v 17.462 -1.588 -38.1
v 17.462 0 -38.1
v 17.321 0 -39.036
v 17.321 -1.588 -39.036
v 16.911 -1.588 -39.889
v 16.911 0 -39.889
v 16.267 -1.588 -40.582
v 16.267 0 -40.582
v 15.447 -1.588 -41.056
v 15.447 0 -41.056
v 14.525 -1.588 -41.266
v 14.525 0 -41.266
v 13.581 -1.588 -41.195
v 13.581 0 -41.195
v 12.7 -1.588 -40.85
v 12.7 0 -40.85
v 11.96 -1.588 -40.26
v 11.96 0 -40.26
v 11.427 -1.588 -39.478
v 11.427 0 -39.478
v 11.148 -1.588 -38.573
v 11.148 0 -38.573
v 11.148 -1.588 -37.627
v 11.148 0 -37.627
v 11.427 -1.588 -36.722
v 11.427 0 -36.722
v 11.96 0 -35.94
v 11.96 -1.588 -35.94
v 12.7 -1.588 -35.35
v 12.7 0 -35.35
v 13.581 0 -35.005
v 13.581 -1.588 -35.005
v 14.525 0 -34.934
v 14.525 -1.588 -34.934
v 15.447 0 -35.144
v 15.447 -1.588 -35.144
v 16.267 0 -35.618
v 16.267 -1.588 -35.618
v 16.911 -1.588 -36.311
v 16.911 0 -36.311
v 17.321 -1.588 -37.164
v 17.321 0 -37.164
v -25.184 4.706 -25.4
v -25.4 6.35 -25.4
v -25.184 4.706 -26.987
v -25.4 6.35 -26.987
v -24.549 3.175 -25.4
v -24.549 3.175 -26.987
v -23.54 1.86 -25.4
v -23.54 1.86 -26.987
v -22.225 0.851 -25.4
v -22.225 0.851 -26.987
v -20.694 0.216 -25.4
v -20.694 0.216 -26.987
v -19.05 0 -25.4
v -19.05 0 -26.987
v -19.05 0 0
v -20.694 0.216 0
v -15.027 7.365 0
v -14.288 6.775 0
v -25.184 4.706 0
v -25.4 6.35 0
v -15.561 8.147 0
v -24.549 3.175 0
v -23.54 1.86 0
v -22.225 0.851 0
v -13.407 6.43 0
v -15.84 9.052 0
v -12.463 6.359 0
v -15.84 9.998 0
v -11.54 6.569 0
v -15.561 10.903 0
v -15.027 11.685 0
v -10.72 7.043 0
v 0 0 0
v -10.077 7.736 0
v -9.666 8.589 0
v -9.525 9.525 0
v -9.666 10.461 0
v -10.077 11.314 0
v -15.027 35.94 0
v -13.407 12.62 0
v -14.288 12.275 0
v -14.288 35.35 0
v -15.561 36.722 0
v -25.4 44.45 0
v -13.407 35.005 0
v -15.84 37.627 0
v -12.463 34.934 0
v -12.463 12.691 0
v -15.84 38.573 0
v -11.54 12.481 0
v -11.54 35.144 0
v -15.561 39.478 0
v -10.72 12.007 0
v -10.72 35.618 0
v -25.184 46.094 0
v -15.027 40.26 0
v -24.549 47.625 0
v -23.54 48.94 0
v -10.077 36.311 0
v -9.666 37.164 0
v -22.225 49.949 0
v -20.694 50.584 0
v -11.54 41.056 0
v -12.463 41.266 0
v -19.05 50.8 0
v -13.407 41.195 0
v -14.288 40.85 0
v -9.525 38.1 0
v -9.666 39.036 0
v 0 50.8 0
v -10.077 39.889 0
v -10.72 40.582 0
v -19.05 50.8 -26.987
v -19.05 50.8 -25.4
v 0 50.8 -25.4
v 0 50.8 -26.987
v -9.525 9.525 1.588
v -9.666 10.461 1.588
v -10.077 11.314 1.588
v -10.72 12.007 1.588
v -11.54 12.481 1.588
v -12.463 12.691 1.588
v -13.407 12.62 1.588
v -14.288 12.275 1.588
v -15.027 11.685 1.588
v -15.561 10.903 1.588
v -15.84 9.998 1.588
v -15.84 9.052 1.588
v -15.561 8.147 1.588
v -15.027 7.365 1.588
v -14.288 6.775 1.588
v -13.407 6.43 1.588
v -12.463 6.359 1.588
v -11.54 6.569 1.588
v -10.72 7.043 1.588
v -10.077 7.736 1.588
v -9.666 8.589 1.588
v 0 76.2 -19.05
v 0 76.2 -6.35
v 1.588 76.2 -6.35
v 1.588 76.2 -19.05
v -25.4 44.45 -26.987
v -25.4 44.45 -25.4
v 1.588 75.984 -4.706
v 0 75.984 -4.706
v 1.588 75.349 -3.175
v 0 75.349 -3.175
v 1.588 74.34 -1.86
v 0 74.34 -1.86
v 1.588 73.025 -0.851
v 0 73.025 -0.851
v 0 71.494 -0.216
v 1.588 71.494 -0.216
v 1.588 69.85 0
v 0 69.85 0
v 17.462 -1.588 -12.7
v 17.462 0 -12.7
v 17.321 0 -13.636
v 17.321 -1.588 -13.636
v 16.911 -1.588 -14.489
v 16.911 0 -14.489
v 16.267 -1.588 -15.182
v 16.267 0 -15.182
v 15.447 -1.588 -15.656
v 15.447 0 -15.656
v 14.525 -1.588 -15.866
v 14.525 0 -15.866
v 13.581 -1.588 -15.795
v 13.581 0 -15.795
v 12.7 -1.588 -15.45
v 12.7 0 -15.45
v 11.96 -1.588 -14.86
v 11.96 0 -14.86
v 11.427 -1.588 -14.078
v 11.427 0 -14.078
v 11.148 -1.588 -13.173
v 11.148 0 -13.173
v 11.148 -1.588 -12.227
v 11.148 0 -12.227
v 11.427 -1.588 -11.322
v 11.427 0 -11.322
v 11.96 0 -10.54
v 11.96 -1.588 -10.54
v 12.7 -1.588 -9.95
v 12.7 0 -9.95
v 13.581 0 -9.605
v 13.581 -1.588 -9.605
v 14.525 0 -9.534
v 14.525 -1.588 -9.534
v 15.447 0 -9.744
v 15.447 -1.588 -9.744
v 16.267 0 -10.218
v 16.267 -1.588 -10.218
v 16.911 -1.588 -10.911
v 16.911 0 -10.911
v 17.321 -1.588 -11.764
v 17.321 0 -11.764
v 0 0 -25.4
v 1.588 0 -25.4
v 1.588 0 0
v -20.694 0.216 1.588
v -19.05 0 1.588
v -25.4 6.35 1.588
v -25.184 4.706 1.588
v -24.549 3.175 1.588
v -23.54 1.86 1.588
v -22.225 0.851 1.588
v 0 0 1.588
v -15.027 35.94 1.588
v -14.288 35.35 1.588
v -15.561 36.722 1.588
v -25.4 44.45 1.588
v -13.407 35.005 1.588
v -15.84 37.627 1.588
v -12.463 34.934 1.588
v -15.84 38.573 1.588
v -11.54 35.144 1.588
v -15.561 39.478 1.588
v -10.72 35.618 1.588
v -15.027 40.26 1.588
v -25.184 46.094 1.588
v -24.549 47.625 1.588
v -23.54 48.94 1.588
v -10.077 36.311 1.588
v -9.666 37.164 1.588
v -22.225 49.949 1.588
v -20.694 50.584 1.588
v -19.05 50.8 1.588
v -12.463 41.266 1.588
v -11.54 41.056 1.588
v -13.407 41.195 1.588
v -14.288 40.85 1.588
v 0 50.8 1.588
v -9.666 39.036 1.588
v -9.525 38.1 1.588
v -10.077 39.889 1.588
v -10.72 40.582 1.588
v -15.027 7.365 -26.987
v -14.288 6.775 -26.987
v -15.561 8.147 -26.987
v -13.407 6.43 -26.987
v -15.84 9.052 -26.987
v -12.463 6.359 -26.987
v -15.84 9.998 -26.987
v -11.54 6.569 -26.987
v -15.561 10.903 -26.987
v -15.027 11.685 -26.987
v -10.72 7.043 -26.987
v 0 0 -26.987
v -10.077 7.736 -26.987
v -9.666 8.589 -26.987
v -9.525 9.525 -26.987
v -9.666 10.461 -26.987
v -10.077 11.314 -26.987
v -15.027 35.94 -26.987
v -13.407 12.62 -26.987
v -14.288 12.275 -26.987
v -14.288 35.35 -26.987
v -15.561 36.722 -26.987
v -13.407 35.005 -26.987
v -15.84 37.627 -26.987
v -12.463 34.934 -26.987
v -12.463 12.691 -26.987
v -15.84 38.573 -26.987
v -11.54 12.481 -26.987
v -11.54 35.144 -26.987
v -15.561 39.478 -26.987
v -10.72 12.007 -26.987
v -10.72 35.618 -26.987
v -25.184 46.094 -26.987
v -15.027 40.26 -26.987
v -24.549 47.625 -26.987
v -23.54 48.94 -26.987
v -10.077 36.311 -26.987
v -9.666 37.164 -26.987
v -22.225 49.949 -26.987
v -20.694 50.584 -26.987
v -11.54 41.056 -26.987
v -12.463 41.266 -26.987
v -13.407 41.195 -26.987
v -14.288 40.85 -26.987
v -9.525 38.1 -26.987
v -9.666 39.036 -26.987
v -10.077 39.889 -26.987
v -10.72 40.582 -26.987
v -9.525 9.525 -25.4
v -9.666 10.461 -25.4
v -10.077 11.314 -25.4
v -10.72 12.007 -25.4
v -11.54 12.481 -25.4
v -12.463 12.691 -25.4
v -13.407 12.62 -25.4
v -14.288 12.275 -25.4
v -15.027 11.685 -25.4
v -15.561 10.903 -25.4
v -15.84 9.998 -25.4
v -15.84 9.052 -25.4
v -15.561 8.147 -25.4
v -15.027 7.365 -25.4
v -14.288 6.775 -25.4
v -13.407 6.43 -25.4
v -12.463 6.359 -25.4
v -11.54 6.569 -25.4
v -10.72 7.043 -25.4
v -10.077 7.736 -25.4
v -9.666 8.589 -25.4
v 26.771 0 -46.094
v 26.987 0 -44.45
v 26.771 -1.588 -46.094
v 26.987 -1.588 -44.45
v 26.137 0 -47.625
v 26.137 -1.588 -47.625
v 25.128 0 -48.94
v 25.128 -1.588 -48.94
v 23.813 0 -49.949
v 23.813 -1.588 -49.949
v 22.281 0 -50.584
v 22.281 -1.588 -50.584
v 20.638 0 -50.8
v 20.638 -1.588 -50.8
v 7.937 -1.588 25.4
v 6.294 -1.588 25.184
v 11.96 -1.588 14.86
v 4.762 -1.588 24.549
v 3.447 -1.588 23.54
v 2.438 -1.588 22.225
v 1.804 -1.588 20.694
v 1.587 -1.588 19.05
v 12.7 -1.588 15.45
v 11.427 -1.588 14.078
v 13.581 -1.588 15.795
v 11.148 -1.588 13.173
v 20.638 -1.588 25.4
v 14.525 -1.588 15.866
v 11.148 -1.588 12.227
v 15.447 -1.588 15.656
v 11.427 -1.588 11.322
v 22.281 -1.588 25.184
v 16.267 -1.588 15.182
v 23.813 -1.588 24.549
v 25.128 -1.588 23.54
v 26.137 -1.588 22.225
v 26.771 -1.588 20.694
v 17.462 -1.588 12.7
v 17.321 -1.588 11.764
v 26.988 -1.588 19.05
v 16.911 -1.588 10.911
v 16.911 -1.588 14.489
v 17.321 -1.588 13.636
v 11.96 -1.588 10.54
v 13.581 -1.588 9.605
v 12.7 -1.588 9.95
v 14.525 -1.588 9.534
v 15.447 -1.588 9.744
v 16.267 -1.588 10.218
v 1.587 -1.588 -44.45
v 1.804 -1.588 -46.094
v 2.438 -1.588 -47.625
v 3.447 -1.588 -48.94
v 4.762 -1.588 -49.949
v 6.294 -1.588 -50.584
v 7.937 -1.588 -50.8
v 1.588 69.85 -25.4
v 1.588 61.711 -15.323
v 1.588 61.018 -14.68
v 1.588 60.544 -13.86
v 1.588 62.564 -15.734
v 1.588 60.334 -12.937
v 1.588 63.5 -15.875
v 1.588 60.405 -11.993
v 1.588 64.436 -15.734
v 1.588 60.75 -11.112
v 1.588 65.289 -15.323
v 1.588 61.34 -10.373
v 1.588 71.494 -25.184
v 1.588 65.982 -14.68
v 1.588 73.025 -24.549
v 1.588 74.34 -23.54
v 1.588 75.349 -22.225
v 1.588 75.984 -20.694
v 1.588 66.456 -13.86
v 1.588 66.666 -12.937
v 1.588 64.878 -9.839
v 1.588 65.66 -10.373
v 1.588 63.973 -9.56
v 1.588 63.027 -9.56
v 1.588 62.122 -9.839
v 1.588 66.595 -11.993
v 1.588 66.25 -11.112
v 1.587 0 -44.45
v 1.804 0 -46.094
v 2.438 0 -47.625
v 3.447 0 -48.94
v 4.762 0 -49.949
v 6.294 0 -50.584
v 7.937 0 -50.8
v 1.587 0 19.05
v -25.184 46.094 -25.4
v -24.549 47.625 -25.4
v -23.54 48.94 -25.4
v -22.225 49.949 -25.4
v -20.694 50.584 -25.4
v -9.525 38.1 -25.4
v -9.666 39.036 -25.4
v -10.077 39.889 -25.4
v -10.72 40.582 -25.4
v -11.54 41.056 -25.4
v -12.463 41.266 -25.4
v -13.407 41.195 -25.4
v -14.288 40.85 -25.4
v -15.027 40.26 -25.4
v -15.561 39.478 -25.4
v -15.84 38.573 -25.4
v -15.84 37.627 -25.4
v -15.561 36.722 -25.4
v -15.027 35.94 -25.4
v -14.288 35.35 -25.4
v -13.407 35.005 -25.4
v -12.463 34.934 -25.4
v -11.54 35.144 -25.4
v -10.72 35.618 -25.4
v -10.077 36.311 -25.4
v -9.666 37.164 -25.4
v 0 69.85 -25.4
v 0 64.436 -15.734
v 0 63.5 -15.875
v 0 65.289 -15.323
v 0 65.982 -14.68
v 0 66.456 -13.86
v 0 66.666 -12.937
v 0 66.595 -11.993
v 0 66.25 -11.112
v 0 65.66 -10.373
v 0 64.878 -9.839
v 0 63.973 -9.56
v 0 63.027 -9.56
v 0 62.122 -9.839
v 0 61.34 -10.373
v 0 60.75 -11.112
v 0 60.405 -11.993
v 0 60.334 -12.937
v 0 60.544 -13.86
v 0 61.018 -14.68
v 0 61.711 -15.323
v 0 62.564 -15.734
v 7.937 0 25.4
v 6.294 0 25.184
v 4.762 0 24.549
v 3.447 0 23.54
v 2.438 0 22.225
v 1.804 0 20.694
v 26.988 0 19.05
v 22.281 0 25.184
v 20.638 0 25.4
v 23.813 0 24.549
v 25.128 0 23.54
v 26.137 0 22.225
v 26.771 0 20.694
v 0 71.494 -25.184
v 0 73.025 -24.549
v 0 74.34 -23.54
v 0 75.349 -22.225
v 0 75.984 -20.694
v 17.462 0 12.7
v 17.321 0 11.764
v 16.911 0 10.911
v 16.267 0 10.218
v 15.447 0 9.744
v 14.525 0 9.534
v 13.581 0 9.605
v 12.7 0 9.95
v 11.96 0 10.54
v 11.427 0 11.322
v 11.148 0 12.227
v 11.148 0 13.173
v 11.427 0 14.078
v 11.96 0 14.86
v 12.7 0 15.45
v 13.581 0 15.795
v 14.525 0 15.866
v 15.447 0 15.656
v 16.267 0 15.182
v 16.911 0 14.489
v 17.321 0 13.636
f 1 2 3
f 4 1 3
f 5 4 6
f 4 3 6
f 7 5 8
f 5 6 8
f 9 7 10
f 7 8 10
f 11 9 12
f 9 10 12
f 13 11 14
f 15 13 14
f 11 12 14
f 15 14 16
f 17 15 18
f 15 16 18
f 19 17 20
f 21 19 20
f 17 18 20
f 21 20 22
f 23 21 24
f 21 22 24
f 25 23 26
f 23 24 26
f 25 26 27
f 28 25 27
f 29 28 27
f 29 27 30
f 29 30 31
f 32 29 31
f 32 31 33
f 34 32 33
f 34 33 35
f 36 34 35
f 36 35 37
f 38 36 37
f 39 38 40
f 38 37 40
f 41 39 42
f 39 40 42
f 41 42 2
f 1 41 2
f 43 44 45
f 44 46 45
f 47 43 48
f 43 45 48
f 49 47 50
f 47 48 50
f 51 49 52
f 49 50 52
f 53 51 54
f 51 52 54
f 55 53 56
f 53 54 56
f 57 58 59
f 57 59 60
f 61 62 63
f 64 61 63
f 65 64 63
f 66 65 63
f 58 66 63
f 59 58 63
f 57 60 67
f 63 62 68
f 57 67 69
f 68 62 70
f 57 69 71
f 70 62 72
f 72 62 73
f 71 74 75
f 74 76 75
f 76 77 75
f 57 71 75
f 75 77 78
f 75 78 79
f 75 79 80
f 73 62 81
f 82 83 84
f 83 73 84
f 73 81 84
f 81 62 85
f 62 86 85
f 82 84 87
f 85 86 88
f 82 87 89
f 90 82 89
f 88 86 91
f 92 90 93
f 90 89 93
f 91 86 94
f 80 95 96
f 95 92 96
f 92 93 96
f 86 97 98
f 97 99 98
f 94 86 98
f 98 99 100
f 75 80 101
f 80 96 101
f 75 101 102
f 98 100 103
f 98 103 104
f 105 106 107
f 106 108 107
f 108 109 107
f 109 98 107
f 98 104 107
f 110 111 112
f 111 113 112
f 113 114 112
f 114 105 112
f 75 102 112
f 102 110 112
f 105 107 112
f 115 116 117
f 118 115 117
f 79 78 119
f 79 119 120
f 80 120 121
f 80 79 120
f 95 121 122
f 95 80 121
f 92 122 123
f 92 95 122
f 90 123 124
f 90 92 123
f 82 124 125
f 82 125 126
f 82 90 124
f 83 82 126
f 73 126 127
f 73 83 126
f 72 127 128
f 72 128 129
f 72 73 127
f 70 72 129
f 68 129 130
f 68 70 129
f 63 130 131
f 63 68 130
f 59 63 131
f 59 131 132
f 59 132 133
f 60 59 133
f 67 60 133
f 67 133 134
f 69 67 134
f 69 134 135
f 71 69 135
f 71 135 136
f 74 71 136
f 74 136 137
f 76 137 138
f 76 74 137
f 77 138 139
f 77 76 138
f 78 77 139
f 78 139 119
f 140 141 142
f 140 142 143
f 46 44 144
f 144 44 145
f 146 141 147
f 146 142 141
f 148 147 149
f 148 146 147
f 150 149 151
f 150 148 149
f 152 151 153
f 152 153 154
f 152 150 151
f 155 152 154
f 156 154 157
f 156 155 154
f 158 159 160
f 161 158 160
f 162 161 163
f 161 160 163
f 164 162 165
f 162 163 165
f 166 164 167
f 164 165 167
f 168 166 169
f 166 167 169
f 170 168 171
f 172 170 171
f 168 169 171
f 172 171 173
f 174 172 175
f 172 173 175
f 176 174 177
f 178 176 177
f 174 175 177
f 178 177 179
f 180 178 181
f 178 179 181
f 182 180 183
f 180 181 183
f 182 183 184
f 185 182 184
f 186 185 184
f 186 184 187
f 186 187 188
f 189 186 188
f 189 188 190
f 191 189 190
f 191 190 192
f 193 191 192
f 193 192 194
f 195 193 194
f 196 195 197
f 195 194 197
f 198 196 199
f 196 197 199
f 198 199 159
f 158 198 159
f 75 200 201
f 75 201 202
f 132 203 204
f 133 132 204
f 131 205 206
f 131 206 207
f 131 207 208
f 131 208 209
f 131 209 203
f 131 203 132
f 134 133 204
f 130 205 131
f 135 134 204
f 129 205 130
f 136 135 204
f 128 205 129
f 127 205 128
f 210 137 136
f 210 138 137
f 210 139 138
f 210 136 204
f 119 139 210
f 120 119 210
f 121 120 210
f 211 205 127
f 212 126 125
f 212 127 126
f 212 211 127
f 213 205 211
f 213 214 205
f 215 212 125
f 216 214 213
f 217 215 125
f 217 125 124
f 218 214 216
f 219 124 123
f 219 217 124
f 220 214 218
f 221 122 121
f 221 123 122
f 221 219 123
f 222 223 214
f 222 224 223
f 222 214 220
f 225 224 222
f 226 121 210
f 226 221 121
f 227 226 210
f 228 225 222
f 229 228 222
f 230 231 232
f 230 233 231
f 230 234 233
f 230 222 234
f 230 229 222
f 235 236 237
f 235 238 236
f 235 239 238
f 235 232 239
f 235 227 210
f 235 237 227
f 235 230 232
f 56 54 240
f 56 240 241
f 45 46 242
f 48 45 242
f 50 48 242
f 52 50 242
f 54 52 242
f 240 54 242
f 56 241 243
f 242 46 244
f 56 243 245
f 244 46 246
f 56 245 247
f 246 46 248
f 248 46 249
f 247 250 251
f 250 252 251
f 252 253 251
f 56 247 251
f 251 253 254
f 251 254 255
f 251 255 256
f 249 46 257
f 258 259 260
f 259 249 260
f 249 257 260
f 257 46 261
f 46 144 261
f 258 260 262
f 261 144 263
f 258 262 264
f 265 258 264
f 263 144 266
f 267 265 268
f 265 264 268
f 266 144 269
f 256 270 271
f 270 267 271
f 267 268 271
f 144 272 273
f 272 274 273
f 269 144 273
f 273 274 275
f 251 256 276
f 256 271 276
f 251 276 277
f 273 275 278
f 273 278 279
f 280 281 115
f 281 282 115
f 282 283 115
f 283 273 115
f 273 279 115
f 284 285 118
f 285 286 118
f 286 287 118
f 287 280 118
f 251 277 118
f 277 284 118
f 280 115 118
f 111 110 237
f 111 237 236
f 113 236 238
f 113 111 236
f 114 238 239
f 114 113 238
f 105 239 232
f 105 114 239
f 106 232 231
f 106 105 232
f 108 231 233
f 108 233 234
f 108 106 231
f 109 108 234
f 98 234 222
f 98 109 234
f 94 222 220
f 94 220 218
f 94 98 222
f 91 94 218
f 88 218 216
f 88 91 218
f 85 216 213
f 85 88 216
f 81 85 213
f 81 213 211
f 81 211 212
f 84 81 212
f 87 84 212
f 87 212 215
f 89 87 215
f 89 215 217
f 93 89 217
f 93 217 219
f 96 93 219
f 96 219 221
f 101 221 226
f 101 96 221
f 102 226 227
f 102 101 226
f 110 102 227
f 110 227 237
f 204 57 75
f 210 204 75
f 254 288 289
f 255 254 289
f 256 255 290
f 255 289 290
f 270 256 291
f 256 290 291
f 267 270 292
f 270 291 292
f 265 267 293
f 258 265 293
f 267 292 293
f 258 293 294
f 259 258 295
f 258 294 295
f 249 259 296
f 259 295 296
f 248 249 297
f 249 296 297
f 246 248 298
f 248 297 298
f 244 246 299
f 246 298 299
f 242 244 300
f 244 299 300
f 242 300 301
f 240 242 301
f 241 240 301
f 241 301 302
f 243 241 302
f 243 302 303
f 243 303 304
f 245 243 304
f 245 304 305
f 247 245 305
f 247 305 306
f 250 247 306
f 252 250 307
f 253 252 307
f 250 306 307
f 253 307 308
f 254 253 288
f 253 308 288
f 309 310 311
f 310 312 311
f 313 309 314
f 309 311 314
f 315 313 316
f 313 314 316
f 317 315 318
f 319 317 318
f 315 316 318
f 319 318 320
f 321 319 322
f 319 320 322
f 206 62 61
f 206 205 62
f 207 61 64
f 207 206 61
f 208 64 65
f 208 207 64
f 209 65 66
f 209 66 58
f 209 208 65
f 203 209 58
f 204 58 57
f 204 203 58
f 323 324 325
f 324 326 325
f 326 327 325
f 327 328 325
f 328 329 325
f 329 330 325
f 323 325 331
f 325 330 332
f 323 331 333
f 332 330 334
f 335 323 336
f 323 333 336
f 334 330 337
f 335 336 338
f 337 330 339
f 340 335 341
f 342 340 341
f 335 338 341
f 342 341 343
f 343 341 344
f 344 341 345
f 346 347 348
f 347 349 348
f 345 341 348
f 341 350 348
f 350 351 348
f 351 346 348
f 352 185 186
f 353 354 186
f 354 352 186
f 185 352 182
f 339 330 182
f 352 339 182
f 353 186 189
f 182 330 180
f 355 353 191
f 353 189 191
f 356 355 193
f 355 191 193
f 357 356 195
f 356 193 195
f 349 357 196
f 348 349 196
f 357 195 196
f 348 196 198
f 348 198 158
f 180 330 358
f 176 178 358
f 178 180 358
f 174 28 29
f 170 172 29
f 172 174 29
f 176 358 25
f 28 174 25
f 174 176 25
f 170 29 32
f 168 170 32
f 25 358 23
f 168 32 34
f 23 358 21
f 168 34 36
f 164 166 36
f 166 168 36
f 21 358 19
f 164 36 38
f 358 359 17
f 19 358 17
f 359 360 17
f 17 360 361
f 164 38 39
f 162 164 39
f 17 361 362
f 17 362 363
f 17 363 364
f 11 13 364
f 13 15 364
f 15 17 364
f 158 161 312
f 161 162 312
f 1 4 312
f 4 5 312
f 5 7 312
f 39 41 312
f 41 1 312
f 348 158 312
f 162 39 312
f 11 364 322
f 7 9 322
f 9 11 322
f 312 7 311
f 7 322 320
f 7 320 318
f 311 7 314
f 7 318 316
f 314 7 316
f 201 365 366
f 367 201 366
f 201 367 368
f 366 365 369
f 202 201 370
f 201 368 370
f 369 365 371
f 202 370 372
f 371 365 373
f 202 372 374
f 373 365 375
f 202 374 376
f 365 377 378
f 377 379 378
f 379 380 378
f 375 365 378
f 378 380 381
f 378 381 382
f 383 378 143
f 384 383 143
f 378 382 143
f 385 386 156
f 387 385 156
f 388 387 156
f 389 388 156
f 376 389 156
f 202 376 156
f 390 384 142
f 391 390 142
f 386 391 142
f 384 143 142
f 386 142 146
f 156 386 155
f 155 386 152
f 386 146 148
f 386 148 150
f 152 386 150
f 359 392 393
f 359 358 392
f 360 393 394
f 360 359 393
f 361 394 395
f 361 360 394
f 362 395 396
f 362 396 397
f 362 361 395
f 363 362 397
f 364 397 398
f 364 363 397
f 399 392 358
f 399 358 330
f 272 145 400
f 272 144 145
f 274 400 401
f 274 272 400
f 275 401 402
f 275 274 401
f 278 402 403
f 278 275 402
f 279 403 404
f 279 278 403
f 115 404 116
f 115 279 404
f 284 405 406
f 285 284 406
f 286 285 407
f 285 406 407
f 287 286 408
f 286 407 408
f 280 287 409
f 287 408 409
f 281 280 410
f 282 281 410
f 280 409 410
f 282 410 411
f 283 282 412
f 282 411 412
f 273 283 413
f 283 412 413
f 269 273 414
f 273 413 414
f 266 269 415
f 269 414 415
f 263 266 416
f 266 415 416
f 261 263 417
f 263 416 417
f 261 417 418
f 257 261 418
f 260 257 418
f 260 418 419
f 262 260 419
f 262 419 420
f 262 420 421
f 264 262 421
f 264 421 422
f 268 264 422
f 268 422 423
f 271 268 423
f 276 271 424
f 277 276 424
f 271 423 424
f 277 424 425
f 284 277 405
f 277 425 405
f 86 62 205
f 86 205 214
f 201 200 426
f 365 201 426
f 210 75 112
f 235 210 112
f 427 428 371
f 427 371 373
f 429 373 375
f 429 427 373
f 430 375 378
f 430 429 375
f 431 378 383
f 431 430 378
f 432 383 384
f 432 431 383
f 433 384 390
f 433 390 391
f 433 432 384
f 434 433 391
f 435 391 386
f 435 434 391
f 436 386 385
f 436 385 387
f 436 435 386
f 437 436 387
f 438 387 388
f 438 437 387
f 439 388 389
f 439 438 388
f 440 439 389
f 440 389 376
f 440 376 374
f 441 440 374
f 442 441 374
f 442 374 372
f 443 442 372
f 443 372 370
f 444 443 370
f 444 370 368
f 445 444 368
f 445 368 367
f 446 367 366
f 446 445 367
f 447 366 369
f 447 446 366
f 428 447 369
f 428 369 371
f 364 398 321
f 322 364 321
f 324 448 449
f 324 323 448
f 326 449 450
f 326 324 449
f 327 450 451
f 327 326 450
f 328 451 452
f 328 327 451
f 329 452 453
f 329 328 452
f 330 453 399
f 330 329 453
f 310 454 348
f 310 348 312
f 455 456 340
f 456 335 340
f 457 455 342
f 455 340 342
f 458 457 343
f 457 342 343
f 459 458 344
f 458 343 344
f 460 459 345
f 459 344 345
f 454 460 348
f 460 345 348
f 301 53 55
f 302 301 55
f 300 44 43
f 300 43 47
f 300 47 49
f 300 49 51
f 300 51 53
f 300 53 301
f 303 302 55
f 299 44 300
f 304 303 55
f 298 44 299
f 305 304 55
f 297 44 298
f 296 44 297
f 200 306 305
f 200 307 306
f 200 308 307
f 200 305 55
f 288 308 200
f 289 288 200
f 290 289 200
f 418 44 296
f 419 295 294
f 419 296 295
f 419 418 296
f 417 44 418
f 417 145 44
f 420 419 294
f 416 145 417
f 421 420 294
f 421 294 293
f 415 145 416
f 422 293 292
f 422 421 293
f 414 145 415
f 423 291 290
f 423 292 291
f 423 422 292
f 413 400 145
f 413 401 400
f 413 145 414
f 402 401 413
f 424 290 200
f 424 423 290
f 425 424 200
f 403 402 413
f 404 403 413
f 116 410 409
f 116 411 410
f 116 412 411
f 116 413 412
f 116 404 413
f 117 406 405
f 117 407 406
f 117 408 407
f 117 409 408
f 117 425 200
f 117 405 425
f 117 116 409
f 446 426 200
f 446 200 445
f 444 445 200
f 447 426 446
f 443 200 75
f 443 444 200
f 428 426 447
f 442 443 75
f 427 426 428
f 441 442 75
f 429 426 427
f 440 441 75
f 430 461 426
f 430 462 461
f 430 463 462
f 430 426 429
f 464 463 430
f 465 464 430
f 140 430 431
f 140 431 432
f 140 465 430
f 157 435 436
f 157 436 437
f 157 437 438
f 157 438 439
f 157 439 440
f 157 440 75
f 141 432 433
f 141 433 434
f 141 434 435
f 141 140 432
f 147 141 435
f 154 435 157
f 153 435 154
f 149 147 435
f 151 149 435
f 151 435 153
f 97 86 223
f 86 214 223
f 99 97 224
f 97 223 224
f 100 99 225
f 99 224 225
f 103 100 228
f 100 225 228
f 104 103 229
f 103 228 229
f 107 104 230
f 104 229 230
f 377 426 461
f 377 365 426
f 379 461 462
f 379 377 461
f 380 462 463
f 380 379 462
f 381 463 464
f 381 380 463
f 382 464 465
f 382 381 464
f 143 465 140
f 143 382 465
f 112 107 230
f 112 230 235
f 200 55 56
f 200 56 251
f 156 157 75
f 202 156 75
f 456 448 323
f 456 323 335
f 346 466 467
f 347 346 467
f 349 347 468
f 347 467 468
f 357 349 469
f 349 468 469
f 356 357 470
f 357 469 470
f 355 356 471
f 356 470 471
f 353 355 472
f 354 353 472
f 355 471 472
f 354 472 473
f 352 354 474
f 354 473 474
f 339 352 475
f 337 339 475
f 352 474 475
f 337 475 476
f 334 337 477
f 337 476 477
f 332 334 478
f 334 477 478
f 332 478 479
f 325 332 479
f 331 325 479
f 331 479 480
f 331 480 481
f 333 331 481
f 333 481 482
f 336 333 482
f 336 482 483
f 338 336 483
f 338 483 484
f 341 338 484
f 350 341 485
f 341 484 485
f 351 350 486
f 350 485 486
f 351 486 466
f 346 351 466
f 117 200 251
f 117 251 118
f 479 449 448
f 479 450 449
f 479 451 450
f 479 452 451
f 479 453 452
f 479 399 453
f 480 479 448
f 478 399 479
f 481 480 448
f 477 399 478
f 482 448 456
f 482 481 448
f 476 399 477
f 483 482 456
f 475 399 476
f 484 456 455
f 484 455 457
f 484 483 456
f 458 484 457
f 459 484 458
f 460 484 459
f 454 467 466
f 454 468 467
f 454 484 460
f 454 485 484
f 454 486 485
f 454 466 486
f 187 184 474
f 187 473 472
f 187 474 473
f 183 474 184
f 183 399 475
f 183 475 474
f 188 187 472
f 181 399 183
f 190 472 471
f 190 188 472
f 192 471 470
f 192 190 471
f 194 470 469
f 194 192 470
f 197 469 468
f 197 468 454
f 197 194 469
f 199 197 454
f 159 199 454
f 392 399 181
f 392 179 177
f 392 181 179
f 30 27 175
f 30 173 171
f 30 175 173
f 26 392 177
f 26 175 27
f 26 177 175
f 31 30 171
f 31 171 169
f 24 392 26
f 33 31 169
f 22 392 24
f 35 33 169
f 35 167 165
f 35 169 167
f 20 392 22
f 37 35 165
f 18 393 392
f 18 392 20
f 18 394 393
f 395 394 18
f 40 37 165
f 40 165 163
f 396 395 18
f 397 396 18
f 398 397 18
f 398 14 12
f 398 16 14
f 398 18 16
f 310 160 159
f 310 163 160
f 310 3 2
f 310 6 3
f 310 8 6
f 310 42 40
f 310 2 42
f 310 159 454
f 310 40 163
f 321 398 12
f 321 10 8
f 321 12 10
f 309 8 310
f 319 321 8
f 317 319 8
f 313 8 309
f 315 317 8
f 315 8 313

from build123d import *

# Parameters (mm, degrees)
SKETCH1_W           = 25.4
SKETCH1_H           = 50.8
SKETCH1_R           = 3.175
BOSS_EXTRUDE1_DEPTH = 1.5875
BOSS_EXTRUDE2_START = -25.4
SKETCH1_2_W         = 25.4
SKETCH1_2_H         = 50.8
SKETCH1_2_R         = 3.175
BOSS_EXTRUDE2_DEPTH = 1.5875
SKETCH3_R           = 3.175
BOSS_EXTRUDE3_DEPTH = 1.5875
SKETCH4_W           = 25.4
SKETCH4_H           = 76.2
SKETCH4_R           = 3.175
BOSS_EXTRUDE4_DEPTH = 1.5875
FILLET1_R           = 6.35
FILLET2_R           = 6.35
FILLET3_R           = 6.35
FILLET4_R           = 6.35


with BuildPart() as part:
    # Sketch1 → Boss-Extrude1 (new body)
    with BuildSketch(Plane.XY):
        with Locations((-12.7, 25.4)):
            Rectangle(SKETCH1_W, SKETCH1_H)
        with Locations((-12.7, 38.1)):
            Circle(SKETCH1_R, mode=Mode.SUBTRACT)
        with Locations((-12.7, 9.525)):
            Circle(SKETCH1_R, mode=Mode.SUBTRACT)
    extrude(amount=BOSS_EXTRUDE1_DEPTH)

    # Fillet3
    fillet3_edges = [part.edges().sort_by_distance(p)[0] for p in [
        (-25.4, 50.8, 0.79375),
        (-25.4, 0, 0.79375),
    ]]
    fillet(fillet3_edges, radius=FILLET3_R)


with BuildPart() as body_2:
    # Sketch1<2> → Boss-Extrude2 (new body)
    with BuildSketch(Plane.XY.offset(BOSS_EXTRUDE2_START)):
        with Locations((-12.7, 25.4)):
            Rectangle(SKETCH1_2_W, SKETCH1_2_H)
        with Locations((-12.7, 38.1)):
            Circle(SKETCH1_2_R, mode=Mode.SUBTRACT)
        with Locations((-12.7, 9.525)):
            Circle(SKETCH1_2_R, mode=Mode.SUBTRACT)
    extrude(amount=-BOSS_EXTRUDE2_DEPTH)

    # Fillet2
    fillet2_edges = [body_2.edges().sort_by_distance(p)[0] for p in [
        (-25.4, 0, -26.19375),
        (-25.4, 50.8, -26.19375),
    ]]
    fillet(fillet2_edges, radius=FILLET2_R)


with BuildPart() as body_3:
    # Sketch3 → Boss-Extrude3 (new body)
    with BuildSketch(Plane(origin=(0, 0, 0), x_dir=(0, 0, -1), z_dir=(1, 0, 0))):
        Polygon((25.4, 50.8), (25.4, 0), (0, 0), (0, 50.8), (0, 76.2), (25.4, 76.2), align=None)
        with Locations((12.7, 63.5)):
            Circle(SKETCH3_R, mode=Mode.SUBTRACT)
    extrude(amount=BOSS_EXTRUDE3_DEPTH)

    # Fillet4
    fillet4_edges = [body_3.edges().sort_by_distance(p)[0] for p in [
        (0.79375, 76.2, -25.4),
        (0.79375, 76.2, 0),
    ]]
    fillet(fillet4_edges, radius=FILLET4_R)


with BuildPart() as body_4:
    # Sketch4 → Boss-Extrude4 (new body)
    with BuildSketch(Plane(origin=(0, 0, 0), x_dir=(1, 0, 0), z_dir=(0, 1, 0))):
        with Locations((14.2875, 12.7)):
            Rectangle(SKETCH4_W, SKETCH4_H)
        with Locations((14.2875, 38.1)):
            Circle(SKETCH4_R, mode=Mode.SUBTRACT)
        with Locations((14.2875, 12.7)):
            Circle(SKETCH4_R, mode=Mode.SUBTRACT)
        with Locations((14.2875, -12.7)):
            Circle(SKETCH4_R, mode=Mode.SUBTRACT)
    extrude(amount=-BOSS_EXTRUDE4_DEPTH)

    # Fillet1
    fillet1_edges = [body_4.edges().sort_by_distance(p)[0] for p in [
        (1.5875, -0.79375, -50.8),
        (26.9875, -0.79375, -50.8),
        (26.9875, -0.79375, 25.4),
        (1.5875, -0.79375, 25.4),
    ]]
    fillet(fillet1_edges, radius=FILLET1_R)


solid = Compound([part.part, body_2.part, body_3.part, body_4.part])
